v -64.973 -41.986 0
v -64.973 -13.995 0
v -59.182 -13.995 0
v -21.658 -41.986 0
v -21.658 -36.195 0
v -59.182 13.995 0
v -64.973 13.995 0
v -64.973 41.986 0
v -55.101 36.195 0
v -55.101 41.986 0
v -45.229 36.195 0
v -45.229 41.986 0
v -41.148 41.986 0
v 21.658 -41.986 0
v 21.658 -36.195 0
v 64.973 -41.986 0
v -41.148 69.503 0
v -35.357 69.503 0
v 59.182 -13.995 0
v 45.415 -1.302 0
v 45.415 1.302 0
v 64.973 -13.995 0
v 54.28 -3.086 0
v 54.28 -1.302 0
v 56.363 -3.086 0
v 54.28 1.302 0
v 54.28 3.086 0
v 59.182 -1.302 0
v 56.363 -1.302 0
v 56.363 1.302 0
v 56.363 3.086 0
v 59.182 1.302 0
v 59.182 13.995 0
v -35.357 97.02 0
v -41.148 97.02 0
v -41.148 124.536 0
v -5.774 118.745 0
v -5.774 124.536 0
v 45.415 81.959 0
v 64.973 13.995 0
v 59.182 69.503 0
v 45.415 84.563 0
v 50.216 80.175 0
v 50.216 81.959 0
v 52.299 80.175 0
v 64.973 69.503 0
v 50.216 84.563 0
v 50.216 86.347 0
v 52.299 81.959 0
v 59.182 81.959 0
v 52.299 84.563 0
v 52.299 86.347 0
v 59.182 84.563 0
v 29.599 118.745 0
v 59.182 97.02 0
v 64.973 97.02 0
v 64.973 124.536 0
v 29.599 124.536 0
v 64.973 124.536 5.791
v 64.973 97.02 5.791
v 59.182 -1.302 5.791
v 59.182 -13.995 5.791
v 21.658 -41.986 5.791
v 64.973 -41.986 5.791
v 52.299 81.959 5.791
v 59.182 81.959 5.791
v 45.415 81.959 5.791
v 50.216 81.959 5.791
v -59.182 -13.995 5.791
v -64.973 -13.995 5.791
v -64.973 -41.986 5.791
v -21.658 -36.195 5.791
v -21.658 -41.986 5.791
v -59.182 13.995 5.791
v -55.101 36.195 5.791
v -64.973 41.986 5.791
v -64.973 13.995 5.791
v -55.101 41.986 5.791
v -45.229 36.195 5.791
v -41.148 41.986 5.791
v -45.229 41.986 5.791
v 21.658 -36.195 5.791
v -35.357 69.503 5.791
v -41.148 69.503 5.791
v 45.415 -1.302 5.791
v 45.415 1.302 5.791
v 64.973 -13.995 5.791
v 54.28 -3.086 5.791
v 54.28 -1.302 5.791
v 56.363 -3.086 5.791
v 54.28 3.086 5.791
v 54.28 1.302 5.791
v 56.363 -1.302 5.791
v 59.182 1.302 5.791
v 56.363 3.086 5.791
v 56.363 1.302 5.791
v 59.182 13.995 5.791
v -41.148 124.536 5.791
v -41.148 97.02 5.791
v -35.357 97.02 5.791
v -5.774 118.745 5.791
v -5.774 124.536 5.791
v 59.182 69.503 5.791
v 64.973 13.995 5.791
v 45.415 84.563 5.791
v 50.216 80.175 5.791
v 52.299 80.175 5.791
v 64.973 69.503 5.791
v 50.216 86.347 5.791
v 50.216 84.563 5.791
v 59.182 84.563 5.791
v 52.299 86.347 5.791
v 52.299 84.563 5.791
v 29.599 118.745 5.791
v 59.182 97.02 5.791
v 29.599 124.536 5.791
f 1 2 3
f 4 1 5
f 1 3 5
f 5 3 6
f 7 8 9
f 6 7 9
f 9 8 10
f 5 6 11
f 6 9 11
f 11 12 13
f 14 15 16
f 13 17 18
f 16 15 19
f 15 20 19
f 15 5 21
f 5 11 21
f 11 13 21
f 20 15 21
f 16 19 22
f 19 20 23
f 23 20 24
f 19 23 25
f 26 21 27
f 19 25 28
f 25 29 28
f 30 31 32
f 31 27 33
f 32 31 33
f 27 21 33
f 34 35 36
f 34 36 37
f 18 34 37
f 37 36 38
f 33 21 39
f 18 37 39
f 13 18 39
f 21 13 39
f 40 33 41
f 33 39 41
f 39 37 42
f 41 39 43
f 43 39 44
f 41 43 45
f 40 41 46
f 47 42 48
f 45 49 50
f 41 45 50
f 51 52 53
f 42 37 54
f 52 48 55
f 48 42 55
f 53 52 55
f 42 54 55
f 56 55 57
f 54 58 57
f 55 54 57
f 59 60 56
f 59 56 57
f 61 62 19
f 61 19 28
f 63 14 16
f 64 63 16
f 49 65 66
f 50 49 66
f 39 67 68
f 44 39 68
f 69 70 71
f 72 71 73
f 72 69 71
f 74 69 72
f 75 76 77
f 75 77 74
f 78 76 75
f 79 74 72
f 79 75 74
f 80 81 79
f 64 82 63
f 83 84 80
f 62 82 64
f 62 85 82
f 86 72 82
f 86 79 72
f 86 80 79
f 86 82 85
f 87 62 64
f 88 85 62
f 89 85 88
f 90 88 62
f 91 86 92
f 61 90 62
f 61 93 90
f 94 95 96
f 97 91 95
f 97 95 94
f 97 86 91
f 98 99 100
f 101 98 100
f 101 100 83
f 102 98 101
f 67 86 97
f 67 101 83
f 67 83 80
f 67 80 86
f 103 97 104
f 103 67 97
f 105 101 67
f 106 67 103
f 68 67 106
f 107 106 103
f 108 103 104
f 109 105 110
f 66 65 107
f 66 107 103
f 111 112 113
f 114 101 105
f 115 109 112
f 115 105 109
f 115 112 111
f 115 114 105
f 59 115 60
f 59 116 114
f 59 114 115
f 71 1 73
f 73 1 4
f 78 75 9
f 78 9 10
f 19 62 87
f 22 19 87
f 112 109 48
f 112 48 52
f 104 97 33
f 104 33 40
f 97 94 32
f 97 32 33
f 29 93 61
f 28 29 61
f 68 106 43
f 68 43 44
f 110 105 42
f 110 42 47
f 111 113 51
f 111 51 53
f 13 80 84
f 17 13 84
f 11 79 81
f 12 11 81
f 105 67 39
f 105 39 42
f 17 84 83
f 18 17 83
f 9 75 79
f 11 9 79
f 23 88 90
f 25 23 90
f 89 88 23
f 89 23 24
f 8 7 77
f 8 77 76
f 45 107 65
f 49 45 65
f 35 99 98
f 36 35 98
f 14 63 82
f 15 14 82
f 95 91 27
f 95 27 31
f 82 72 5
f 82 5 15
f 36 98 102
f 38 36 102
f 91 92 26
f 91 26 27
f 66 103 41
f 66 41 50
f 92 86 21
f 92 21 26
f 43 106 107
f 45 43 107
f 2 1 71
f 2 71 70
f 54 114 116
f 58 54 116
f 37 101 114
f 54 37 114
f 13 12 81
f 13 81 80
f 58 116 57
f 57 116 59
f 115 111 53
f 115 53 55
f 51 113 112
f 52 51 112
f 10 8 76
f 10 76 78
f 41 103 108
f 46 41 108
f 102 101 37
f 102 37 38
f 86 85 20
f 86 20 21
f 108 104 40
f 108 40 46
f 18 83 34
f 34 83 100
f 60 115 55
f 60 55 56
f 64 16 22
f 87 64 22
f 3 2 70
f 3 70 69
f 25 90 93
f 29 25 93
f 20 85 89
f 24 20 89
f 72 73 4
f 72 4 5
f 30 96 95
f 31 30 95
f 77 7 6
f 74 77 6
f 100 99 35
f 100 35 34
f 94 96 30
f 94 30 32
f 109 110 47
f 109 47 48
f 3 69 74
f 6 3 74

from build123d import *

# Parameters (mm, degrees)
SKETCH1_W           = 129.9464
SKETCH1_H           = 83.9724
BOSS_EXTRUDE1_DEPTH = 5.7912
SKETCH2_W           = 9.872133334
SKETCH2_H           = 5.7912
CUT_EXTRUDE1_DEPTH  = 6.7912
SKETCH3_W           = 5.7912
SKETCH3_H           = 27.9908
CUT_EXTRUDE2_DEPTH  = 6.7912
SKETCH4_W           = 13.7668
SKETCH4_H           = 2.6035
CUT_EXTRUDE3_DEPTH  = 6.7912
SKETCH6_W           = 2.0828
SKETCH6_H           = 6.1722
CUT_EXTRUDE5_DEPTH  = 6.7912
SKETCH7_W           = 106.1212
SKETCH7_H           = 82.55
BOSS_EXTRUDE2_DEPTH = 5.7912
SKETCH8_W           = 43.315466666
SKETCH8_H           = 5.7912
CUT_EXTRUDE6_DEPTH  = 6.7912
SKETCH12_W          = 5.7912
SKETCH12_H          = 27.516666666
CUT_EXTRUDE9_DEPTH  = 6.7912
SKETCH13_W          = 13.7668
SKETCH13_H          = 2.6035
CUT_EXTRUDE10_DEPTH = 6.7912
SKETCH14_W          = 2.0828
SKETCH14_H          = 6.1722
CUT_EXTRUDE11_DEPTH = 6.7912
SKETCH15_W          = 35.373733334
SKETCH15_H          = 5.7912
CUT_EXTRUDE12_DEPTH = 6.7912


with BuildPart() as part:
    # Sketch1 → Boss-Extrude1 (new body)
    with BuildSketch(Plane.XY):
        Rectangle(SKETCH1_W, SKETCH1_H)
    extrude(amount=BOSS_EXTRUDE1_DEPTH)

    # Sketch2 → Cut-Extrude1 (cut, through all)
    with BuildSketch(Plane.XY.offset(5.7912)):
        with Locations((-50.165, 39.0906)):
            Rectangle(SKETCH2_W, SKETCH2_H)
    extrude(amount=-CUT_EXTRUDE1_DEPTH, mode=Mode.SUBTRACT)

    # Sketch3 → Cut-Extrude2 (cut, through all)
    with BuildSketch(Plane.XY.offset(5.7912)):
        with Locations((-62.0776, 0)):
            Rectangle(SKETCH3_W, SKETCH3_H)
        with Locations((62.0776, 0)):
            Rectangle(SKETCH3_W, SKETCH3_H)
    extrude(amount=-CUT_EXTRUDE2_DEPTH, mode=Mode.SUBTRACT)

    # Sketch4 → Cut-Extrude3 (cut, through all)
    with BuildSketch(Plane.XY.offset(5.7912)):
        with Locations((52.2986, 0)):
            Rectangle(SKETCH4_W, SKETCH4_H)
    extrude(amount=-CUT_EXTRUDE3_DEPTH, mode=Mode.SUBTRACT)

    # Sketch6 → Cut-Extrude5 (cut, through all)
    with BuildSketch(Plane.XY.offset(5.7912)):
        with Locations((55.3212, 0)):
            Rectangle(SKETCH6_W, SKETCH6_H)
    extrude(amount=-CUT_EXTRUDE5_DEPTH, mode=Mode.SUBTRACT)

    # Sketch7 → Boss-Extrude2 (add)
    with BuildSketch(Plane.XY.offset(5.7912)):
        with Locations((11.9126, 83.2612)):
            Rectangle(SKETCH7_W, SKETCH7_H)
    extrude(amount=-BOSS_EXTRUDE2_DEPTH)

    # Sketch8 → Cut-Extrude6 (cut, through all)
    with BuildSketch(Plane.XY.offset(5.7912)):
        with Locations((0, -39.0906)):
            Rectangle(SKETCH8_W, SKETCH8_H)
    extrude(amount=-CUT_EXTRUDE6_DEPTH, mode=Mode.SUBTRACT)

    # Sketch12 → Cut-Extrude9 (cut, through all)
    with BuildSketch(Plane.XY.offset(5.7912)):
        with Locations((62.0776, 83.2612)):
            Rectangle(SKETCH12_W, SKETCH12_H)
        with Locations((-38.2524, 83.2612)):
            Rectangle(SKETCH12_W, SKETCH12_H)
    extrude(amount=-CUT_EXTRUDE9_DEPTH, mode=Mode.SUBTRACT)

    # Sketch13 → Cut-Extrude10 (cut, through all)
    with BuildSketch(Plane.XY.offset(5.7912)):
        with Locations((52.2986, 83.2612)):
            Rectangle(SKETCH13_W, SKETCH13_H)
    extrude(amount=-CUT_EXTRUDE10_DEPTH, mode=Mode.SUBTRACT)

    # Sketch14 → Cut-Extrude11 (cut, through all)
    with BuildSketch(Plane.XY.offset(5.7912)):
        with Locations((51.2572, 83.2612)):
            Rectangle(SKETCH14_W, SKETCH14_H)
    extrude(amount=-CUT_EXTRUDE11_DEPTH, mode=Mode.SUBTRACT)

    # Sketch15 → Cut-Extrude12 (cut, through all)
    with BuildSketch(Plane.XY.offset(5.7912)):
        with Locations((11.9126, 121.6406)):
            Rectangle(SKETCH15_W, SKETCH15_H)
    extrude(amount=-CUT_EXTRUDE12_DEPTH, mode=Mode.SUBTRACT)


solid = part.part
